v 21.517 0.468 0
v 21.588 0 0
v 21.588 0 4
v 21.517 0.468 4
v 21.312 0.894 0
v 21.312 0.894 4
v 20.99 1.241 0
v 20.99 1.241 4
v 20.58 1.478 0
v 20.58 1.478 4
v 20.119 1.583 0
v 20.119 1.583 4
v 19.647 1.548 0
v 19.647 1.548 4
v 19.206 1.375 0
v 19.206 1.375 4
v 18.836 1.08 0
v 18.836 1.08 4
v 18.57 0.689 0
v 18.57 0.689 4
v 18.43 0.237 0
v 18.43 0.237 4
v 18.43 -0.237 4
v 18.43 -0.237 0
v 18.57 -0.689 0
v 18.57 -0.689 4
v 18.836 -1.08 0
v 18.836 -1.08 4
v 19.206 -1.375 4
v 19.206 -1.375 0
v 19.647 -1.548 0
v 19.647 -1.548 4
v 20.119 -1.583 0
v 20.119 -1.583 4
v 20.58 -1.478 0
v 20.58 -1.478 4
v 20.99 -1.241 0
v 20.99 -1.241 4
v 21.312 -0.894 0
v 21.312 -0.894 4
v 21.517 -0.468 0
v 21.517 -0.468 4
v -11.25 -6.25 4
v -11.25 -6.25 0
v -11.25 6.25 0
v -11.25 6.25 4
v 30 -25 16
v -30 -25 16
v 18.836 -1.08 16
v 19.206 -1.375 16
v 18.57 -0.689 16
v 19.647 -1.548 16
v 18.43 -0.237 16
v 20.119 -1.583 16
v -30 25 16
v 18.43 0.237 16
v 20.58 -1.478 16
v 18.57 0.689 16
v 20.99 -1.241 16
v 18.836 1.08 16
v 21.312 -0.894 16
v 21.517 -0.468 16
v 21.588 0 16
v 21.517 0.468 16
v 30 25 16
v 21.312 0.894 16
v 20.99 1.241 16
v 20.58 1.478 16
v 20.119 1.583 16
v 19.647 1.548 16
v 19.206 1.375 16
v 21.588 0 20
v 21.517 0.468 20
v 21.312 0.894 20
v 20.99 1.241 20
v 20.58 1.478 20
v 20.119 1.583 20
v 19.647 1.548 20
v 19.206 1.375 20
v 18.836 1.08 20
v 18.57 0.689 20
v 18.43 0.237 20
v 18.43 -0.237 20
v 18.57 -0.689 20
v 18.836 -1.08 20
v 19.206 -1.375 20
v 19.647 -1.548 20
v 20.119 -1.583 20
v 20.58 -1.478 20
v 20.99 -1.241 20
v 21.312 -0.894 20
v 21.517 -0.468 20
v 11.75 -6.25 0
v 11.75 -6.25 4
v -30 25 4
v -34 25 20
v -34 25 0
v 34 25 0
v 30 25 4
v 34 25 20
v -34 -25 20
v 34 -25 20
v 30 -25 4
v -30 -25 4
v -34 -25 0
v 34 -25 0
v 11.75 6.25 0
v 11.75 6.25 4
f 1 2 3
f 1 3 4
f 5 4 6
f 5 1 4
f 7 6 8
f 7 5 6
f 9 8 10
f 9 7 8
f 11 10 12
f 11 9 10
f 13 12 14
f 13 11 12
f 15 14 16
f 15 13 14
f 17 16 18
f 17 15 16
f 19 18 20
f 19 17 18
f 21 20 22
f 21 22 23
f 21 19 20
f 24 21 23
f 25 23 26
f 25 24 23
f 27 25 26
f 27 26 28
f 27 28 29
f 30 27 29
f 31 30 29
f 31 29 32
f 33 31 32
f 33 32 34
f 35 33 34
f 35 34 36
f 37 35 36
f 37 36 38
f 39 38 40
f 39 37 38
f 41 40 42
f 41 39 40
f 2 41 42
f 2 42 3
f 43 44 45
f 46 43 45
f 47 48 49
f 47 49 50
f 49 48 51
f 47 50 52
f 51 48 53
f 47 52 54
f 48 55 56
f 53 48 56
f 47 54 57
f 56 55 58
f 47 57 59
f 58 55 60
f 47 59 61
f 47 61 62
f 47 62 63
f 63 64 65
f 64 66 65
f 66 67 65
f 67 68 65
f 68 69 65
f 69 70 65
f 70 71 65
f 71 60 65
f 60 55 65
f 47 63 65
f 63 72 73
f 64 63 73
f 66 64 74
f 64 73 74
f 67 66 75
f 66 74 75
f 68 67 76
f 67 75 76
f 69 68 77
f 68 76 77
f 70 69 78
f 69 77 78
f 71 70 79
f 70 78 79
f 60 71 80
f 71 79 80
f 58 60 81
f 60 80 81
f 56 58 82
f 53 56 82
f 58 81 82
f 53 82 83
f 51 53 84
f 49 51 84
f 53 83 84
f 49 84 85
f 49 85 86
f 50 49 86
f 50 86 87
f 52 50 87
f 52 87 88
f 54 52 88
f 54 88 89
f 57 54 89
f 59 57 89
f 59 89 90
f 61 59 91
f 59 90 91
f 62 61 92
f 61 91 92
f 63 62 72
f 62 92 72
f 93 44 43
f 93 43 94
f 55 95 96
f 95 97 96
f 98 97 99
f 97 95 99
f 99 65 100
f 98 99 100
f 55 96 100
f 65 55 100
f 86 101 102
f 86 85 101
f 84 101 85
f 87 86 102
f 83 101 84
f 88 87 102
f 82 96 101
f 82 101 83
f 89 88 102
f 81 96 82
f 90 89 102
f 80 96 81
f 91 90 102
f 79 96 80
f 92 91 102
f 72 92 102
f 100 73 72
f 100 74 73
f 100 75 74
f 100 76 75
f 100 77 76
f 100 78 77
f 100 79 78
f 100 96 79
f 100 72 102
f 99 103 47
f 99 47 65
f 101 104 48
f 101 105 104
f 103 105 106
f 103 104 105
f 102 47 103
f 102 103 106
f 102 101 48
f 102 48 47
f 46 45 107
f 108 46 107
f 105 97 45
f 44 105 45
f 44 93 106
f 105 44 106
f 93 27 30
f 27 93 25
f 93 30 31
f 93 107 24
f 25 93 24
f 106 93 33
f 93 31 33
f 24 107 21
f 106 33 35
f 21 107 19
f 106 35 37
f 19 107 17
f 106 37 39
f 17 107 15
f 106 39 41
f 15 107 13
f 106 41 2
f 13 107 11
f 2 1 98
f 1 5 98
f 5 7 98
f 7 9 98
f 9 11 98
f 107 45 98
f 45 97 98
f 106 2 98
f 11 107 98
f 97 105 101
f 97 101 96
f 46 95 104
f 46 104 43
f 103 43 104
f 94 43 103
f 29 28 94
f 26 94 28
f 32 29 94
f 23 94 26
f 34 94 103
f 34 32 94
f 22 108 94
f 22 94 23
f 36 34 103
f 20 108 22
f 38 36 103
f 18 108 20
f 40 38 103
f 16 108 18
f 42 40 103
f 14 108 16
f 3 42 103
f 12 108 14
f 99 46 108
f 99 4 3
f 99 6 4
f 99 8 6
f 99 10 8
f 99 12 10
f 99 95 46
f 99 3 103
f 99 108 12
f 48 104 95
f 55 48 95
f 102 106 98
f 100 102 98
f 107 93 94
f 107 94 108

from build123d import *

# Parameters (mm, degrees)
F0_W     = 60
F0_H     = 50
F0_W_2   = 23
F0_H_2   = 12.5
F0_R     = 1.5875
F1_DEPTH = 4
F0_W_3   = 4
F2_DEPTH = 20
F4_W     = 60
F4_H     = 50
F4_R     = 1.5875
F5_DEPTH = 4


with BuildPart() as f1:
    # F0 (on Top) → F1 (new body)
    with BuildSketch(Plane.XY):
        Rectangle(F0_W, F0_H)
        with Locations((0.25, 0)):
            Rectangle(F0_W_2, F0_H_2, mode=Mode.SUBTRACT)
        with Locations((20, 0)):
            Circle(F0_R, mode=Mode.SUBTRACT)
    extrude(amount=F1_DEPTH)

    # F0 (on Top) → F2 (join)
    with BuildSketch(Plane.XY):
        with Locations((-32, 0)):
            Rectangle(F0_W_3, F0_H)
        with Locations((32, 0)):
            Rectangle(F0_W_3, F0_H)
    extrude(amount=F2_DEPTH)

    # F4 (on offset) → F5 (join)
    with BuildSketch(Plane.XY.offset(20)):
        Rectangle(F4_W, F4_H)
        with Locations((20, 0)):
            Circle(F4_R, mode=Mode.SUBTRACT)
    extrude(amount=-F5_DEPTH)


solid = f1.part
